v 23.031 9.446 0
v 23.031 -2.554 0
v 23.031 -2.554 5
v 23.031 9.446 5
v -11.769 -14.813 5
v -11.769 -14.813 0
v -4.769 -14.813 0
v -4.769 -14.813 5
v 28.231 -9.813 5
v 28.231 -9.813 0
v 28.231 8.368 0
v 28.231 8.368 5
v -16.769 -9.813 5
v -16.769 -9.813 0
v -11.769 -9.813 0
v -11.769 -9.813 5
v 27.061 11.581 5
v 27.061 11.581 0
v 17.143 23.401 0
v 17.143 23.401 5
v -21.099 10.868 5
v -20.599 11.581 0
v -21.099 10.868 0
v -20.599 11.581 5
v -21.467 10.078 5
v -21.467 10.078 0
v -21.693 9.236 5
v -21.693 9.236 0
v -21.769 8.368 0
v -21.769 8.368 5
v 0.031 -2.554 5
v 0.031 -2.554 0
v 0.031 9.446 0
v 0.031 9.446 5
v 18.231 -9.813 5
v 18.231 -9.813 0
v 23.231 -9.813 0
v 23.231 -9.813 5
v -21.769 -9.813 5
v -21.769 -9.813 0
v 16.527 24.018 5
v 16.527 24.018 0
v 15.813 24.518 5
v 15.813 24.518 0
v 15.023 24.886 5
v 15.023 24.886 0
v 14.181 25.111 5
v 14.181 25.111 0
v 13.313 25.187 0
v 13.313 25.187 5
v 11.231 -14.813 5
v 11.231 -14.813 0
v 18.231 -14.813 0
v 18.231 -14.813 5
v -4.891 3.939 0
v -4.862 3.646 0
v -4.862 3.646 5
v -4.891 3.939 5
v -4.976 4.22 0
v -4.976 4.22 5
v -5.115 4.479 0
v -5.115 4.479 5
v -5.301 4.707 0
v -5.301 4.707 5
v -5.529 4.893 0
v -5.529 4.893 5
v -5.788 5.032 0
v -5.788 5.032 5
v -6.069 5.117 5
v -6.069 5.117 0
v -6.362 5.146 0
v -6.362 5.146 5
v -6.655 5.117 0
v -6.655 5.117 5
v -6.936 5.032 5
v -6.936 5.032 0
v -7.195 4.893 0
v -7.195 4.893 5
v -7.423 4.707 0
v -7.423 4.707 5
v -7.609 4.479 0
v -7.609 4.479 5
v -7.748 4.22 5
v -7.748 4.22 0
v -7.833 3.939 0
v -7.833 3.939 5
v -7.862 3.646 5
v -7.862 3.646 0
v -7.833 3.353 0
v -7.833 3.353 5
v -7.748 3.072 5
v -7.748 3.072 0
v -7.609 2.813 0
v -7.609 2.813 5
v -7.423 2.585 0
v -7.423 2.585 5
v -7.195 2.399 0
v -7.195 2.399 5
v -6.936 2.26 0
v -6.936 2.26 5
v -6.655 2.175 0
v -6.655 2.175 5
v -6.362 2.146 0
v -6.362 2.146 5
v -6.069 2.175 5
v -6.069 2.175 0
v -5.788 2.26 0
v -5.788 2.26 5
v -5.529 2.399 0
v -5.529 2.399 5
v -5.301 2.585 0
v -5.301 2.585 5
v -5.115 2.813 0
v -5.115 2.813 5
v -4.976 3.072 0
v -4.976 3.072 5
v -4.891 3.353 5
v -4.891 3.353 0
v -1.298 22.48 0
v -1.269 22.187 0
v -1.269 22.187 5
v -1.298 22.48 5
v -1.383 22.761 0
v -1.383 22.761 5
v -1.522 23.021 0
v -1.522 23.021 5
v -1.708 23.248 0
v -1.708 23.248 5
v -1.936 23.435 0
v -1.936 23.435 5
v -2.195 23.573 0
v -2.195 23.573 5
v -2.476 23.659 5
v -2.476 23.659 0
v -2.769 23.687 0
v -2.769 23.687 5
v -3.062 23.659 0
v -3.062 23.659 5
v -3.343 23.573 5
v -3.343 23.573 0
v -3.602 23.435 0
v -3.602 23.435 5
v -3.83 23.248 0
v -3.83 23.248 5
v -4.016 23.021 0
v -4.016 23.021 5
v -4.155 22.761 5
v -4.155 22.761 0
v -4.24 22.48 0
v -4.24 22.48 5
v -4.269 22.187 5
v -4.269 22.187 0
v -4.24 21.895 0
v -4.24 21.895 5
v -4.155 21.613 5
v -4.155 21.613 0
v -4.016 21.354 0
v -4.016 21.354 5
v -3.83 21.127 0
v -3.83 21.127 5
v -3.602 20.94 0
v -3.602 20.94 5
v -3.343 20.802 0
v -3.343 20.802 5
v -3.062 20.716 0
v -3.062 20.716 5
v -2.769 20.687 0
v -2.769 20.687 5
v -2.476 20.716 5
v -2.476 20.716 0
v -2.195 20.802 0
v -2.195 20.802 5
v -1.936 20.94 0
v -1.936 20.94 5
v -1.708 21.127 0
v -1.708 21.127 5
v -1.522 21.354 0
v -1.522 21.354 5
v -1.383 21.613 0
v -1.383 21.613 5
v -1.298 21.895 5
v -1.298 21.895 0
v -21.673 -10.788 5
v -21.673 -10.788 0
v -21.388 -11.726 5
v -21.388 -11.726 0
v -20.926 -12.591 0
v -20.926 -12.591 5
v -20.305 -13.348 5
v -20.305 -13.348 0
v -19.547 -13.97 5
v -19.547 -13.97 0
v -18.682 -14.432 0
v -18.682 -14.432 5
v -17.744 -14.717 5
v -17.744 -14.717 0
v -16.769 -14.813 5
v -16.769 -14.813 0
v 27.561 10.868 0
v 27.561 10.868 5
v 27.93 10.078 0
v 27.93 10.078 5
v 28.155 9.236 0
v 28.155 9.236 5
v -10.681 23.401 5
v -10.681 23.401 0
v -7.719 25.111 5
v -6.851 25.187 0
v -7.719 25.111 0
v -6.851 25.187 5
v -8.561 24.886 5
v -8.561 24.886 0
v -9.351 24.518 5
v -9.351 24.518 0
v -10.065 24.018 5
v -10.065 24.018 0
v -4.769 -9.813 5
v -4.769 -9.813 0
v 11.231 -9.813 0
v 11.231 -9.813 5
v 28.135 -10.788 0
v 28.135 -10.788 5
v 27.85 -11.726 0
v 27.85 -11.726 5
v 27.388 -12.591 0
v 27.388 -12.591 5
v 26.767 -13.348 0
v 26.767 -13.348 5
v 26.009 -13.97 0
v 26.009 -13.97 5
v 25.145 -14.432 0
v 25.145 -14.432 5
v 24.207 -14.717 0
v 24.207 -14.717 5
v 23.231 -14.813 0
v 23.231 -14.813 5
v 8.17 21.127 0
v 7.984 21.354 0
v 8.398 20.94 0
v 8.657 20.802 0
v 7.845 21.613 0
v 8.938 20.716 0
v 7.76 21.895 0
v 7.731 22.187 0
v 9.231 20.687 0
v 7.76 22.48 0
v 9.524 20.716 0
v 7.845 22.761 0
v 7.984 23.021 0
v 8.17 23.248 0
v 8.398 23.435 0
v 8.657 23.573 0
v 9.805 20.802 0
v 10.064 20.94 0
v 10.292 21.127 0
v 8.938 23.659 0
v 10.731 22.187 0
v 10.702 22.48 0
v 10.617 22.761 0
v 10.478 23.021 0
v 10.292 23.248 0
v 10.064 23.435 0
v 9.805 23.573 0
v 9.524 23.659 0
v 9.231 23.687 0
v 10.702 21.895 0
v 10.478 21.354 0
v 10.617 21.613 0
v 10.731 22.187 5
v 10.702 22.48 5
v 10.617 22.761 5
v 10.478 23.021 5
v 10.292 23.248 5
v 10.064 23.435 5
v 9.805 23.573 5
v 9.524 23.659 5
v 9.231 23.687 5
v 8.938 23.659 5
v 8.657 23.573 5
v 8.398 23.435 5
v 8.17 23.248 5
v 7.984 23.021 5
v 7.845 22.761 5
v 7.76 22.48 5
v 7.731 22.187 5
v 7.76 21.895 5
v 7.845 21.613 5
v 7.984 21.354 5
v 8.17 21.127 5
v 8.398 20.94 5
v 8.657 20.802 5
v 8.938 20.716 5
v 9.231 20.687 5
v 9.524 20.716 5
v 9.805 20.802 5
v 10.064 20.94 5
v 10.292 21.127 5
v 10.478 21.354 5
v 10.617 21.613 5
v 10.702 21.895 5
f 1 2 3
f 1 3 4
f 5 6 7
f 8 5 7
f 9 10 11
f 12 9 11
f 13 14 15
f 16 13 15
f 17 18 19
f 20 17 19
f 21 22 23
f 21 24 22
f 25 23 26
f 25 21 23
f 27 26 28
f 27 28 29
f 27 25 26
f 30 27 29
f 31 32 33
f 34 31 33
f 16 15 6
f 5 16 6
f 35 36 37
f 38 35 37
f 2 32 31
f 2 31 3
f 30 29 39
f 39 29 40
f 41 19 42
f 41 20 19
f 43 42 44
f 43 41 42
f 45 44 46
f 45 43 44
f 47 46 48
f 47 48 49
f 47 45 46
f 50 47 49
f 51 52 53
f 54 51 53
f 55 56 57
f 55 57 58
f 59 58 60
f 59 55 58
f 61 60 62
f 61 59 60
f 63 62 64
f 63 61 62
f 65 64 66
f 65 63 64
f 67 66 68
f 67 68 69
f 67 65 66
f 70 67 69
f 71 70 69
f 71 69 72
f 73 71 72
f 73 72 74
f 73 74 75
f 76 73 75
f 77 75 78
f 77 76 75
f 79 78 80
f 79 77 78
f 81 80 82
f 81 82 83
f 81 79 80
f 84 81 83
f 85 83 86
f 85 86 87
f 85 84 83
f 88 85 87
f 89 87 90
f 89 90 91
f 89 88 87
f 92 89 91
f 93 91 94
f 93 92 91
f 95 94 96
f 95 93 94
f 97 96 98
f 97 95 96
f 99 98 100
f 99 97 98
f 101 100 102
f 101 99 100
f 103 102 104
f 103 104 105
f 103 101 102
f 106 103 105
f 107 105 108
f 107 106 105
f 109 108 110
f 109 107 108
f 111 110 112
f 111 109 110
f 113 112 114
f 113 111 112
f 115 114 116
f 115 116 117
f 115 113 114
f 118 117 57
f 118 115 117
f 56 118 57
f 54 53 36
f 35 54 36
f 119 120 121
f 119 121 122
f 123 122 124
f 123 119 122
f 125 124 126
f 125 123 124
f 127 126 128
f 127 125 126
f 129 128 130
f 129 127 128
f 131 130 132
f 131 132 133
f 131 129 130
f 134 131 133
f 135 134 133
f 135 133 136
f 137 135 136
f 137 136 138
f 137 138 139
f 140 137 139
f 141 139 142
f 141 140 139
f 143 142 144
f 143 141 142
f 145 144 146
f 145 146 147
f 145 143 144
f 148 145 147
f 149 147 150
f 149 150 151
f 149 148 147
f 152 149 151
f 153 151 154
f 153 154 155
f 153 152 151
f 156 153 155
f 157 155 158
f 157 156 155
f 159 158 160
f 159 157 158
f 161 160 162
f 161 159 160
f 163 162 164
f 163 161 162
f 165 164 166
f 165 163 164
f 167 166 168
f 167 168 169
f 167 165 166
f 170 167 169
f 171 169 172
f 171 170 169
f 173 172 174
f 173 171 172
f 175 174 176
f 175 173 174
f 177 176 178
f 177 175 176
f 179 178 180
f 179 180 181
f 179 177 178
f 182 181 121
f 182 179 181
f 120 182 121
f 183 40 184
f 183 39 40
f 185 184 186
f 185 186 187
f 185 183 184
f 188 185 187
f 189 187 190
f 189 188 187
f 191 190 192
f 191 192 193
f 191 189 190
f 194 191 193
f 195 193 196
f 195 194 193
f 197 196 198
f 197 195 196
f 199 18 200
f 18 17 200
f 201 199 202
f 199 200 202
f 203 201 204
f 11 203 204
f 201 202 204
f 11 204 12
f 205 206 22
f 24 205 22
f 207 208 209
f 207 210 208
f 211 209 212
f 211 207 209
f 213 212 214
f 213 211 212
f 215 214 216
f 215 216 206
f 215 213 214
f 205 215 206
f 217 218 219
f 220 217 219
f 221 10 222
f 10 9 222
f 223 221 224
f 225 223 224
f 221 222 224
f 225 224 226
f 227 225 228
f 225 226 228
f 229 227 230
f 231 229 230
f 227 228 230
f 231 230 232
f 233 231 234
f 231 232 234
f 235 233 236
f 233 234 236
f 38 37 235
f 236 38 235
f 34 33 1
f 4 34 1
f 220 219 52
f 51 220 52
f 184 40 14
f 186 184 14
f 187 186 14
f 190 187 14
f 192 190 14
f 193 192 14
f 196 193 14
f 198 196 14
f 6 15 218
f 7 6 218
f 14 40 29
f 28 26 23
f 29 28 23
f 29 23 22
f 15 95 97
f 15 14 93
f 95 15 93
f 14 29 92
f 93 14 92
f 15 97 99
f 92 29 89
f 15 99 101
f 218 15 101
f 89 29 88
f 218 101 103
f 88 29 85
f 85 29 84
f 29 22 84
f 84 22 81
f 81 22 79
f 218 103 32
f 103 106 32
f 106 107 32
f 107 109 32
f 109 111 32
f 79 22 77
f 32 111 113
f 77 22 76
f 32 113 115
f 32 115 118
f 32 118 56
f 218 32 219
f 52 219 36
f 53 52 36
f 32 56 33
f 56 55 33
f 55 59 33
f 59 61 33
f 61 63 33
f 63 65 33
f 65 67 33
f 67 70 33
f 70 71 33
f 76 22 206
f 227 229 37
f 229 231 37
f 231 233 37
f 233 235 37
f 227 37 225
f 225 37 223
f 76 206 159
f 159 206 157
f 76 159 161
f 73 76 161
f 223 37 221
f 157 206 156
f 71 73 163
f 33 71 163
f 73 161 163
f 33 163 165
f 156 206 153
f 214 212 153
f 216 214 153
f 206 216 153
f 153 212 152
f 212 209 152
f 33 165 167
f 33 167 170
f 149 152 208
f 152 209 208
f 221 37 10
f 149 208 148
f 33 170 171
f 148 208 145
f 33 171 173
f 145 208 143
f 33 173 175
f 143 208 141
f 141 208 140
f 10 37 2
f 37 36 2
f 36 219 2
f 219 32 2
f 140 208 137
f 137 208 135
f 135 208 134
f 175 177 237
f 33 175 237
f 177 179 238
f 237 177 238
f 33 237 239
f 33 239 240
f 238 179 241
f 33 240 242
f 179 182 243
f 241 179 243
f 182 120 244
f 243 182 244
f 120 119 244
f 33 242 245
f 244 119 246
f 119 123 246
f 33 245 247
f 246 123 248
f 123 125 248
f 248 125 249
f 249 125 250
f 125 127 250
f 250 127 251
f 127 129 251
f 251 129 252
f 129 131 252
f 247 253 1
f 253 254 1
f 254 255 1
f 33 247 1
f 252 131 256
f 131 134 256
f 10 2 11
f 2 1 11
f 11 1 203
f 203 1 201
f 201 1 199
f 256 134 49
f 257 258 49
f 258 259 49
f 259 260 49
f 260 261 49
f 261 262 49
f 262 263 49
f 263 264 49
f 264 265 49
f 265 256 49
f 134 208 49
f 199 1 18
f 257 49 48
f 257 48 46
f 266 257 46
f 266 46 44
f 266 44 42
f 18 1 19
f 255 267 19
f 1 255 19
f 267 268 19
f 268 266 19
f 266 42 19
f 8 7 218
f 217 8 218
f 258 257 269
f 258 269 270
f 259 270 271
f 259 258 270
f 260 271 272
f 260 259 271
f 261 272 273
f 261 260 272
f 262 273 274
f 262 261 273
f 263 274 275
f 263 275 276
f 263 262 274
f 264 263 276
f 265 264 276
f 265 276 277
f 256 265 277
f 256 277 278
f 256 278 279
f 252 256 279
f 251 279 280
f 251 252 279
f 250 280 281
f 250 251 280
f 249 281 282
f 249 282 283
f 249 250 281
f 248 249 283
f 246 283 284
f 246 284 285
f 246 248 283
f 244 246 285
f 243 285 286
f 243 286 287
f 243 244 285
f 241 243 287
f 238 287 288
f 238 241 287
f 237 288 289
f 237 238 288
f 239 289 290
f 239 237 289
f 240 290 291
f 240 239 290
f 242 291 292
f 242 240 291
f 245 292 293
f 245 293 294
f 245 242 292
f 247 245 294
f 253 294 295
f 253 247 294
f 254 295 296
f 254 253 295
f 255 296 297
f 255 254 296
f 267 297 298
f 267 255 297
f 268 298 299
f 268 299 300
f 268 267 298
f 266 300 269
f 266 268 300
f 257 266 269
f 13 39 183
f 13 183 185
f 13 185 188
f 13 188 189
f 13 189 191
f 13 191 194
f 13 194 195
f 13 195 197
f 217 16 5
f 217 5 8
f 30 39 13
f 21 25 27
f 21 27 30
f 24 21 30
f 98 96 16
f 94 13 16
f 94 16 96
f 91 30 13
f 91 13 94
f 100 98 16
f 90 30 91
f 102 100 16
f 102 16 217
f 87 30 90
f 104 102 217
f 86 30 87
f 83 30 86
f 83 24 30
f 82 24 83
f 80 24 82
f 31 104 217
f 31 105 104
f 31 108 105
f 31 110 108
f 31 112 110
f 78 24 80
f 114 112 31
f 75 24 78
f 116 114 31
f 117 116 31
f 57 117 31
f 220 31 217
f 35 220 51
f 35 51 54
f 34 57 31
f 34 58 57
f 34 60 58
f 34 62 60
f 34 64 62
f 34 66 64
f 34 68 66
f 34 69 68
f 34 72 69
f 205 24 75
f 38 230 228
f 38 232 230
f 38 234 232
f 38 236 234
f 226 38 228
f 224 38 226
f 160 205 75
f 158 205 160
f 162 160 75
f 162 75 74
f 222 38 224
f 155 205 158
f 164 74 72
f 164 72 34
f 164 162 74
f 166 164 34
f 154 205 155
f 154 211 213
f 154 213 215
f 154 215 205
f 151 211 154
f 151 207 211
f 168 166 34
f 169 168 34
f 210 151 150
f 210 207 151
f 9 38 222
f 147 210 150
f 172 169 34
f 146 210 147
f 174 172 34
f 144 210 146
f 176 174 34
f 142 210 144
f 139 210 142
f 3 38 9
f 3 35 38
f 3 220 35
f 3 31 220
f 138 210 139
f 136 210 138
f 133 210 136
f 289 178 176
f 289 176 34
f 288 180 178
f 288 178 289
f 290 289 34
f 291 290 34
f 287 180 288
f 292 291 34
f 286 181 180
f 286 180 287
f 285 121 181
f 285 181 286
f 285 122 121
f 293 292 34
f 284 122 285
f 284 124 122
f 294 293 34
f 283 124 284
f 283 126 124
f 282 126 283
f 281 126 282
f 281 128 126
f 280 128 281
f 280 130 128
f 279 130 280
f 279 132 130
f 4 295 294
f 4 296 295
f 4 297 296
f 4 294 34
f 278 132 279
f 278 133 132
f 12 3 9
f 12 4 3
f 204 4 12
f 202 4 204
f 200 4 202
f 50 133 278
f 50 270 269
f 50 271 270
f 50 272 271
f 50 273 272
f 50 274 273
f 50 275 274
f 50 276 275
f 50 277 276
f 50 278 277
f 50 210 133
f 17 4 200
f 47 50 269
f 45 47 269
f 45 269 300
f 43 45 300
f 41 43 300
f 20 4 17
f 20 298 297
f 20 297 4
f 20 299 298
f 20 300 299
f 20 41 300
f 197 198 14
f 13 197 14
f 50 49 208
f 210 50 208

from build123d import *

# Parameters (mm, degrees)
SKETCH1_R           = 1.5
SKETCH1_W           = 23
SKETCH1_H           = 12
BOSS_EXTRUDE1_DEPTH = 5
FILLET1_R           = 5
FILLET2_R           = 5
FILLET3_R           = 5
FILLET4_R           = 5
FILLET5_R           = 5
FILLET6_R           = 5


with BuildPart() as part:
    # Sketch1 → Boss-Extrude1 (new body)
    with BuildSketch(Plane.XY):
        Polygon((28.231059773, 10.187376726), (15.644565305, 25.187376726), (-9.182445759, 25.187376726), (-21.768940227, 10.187376726), (-21.768940227, -14.812623274), (-16.768940227, -14.812623274), (-16.768940227, -9.812623274), (-11.768940227, -9.812623274), (-11.768940227, -14.812623274), (-4.768940227, -14.812623274), (-4.768940227, -9.812623274), (11.231059773, -9.812623274), (11.231059773, -14.812623274), (18.231059773, -14.812623274), (18.231059773, -9.812623274), (23.231059773, -9.812623274), (23.231059773, -14.812623274), (28.231059773, -14.812623274), align=None)
        with Locations((-2.768940227, 22.187376726)):
            Circle(SKETCH1_R, mode=Mode.SUBTRACT)
        with Locations((9.231059773, 22.187376726)):
            Circle(SKETCH1_R, mode=Mode.SUBTRACT)
        with Locations((-6.361893004, 3.645929715)):
            Circle(SKETCH1_R, mode=Mode.SUBTRACT)
        with Locations((11.531059773, 3.445929715)):
            Rectangle(SKETCH1_W, SKETCH1_H, mode=Mode.SUBTRACT)
    extrude(amount=BOSS_EXTRUDE1_DEPTH)

    # Fillet1
    fillet1_edges = [part.edges().sort_by_distance(p)[0] for p in [
        (15.644565305, 25.187376726, 2.5),
    ]]
    fillet(fillet1_edges, radius=FILLET1_R)

    # Fillet2
    fillet2_edges = [part.edges().sort_by_distance(p)[0] for p in [
        (28.231059773, 10.187376726, 2.5),
    ]]
    fillet(fillet2_edges, radius=FILLET2_R)

    # Fillet3
    fillet3_edges = [part.edges().sort_by_distance(p)[0] for p in [
        (28.231059773, -14.812623274, 2.5),
    ]]
    fillet(fillet3_edges, radius=FILLET3_R - 0.0001)  # a hair under: the kernel refuses the full size

    # Fillet4
    fillet4_edges = [part.edges().sort_by_distance(p)[0] for p in [
        (-9.182445759, 25.187376726, 2.5),
    ]]
    fillet(fillet4_edges, radius=FILLET4_R)

    # Fillet5
    fillet5_edges = [part.edges().sort_by_distance(p)[0] for p in [
        (-21.768940227, 10.187376726, 2.5),
    ]]
    fillet(fillet5_edges, radius=FILLET5_R)

    # Fillet6
    fillet6_edges = [part.edges().sort_by_distance(p)[0] for p in [
        (-21.768940227, -14.812623274, 2.5),
    ]]
    fillet(fillet6_edges, radius=FILLET6_R - 0.0001)  # a hair under: the kernel refuses the full size


solid = part.part
